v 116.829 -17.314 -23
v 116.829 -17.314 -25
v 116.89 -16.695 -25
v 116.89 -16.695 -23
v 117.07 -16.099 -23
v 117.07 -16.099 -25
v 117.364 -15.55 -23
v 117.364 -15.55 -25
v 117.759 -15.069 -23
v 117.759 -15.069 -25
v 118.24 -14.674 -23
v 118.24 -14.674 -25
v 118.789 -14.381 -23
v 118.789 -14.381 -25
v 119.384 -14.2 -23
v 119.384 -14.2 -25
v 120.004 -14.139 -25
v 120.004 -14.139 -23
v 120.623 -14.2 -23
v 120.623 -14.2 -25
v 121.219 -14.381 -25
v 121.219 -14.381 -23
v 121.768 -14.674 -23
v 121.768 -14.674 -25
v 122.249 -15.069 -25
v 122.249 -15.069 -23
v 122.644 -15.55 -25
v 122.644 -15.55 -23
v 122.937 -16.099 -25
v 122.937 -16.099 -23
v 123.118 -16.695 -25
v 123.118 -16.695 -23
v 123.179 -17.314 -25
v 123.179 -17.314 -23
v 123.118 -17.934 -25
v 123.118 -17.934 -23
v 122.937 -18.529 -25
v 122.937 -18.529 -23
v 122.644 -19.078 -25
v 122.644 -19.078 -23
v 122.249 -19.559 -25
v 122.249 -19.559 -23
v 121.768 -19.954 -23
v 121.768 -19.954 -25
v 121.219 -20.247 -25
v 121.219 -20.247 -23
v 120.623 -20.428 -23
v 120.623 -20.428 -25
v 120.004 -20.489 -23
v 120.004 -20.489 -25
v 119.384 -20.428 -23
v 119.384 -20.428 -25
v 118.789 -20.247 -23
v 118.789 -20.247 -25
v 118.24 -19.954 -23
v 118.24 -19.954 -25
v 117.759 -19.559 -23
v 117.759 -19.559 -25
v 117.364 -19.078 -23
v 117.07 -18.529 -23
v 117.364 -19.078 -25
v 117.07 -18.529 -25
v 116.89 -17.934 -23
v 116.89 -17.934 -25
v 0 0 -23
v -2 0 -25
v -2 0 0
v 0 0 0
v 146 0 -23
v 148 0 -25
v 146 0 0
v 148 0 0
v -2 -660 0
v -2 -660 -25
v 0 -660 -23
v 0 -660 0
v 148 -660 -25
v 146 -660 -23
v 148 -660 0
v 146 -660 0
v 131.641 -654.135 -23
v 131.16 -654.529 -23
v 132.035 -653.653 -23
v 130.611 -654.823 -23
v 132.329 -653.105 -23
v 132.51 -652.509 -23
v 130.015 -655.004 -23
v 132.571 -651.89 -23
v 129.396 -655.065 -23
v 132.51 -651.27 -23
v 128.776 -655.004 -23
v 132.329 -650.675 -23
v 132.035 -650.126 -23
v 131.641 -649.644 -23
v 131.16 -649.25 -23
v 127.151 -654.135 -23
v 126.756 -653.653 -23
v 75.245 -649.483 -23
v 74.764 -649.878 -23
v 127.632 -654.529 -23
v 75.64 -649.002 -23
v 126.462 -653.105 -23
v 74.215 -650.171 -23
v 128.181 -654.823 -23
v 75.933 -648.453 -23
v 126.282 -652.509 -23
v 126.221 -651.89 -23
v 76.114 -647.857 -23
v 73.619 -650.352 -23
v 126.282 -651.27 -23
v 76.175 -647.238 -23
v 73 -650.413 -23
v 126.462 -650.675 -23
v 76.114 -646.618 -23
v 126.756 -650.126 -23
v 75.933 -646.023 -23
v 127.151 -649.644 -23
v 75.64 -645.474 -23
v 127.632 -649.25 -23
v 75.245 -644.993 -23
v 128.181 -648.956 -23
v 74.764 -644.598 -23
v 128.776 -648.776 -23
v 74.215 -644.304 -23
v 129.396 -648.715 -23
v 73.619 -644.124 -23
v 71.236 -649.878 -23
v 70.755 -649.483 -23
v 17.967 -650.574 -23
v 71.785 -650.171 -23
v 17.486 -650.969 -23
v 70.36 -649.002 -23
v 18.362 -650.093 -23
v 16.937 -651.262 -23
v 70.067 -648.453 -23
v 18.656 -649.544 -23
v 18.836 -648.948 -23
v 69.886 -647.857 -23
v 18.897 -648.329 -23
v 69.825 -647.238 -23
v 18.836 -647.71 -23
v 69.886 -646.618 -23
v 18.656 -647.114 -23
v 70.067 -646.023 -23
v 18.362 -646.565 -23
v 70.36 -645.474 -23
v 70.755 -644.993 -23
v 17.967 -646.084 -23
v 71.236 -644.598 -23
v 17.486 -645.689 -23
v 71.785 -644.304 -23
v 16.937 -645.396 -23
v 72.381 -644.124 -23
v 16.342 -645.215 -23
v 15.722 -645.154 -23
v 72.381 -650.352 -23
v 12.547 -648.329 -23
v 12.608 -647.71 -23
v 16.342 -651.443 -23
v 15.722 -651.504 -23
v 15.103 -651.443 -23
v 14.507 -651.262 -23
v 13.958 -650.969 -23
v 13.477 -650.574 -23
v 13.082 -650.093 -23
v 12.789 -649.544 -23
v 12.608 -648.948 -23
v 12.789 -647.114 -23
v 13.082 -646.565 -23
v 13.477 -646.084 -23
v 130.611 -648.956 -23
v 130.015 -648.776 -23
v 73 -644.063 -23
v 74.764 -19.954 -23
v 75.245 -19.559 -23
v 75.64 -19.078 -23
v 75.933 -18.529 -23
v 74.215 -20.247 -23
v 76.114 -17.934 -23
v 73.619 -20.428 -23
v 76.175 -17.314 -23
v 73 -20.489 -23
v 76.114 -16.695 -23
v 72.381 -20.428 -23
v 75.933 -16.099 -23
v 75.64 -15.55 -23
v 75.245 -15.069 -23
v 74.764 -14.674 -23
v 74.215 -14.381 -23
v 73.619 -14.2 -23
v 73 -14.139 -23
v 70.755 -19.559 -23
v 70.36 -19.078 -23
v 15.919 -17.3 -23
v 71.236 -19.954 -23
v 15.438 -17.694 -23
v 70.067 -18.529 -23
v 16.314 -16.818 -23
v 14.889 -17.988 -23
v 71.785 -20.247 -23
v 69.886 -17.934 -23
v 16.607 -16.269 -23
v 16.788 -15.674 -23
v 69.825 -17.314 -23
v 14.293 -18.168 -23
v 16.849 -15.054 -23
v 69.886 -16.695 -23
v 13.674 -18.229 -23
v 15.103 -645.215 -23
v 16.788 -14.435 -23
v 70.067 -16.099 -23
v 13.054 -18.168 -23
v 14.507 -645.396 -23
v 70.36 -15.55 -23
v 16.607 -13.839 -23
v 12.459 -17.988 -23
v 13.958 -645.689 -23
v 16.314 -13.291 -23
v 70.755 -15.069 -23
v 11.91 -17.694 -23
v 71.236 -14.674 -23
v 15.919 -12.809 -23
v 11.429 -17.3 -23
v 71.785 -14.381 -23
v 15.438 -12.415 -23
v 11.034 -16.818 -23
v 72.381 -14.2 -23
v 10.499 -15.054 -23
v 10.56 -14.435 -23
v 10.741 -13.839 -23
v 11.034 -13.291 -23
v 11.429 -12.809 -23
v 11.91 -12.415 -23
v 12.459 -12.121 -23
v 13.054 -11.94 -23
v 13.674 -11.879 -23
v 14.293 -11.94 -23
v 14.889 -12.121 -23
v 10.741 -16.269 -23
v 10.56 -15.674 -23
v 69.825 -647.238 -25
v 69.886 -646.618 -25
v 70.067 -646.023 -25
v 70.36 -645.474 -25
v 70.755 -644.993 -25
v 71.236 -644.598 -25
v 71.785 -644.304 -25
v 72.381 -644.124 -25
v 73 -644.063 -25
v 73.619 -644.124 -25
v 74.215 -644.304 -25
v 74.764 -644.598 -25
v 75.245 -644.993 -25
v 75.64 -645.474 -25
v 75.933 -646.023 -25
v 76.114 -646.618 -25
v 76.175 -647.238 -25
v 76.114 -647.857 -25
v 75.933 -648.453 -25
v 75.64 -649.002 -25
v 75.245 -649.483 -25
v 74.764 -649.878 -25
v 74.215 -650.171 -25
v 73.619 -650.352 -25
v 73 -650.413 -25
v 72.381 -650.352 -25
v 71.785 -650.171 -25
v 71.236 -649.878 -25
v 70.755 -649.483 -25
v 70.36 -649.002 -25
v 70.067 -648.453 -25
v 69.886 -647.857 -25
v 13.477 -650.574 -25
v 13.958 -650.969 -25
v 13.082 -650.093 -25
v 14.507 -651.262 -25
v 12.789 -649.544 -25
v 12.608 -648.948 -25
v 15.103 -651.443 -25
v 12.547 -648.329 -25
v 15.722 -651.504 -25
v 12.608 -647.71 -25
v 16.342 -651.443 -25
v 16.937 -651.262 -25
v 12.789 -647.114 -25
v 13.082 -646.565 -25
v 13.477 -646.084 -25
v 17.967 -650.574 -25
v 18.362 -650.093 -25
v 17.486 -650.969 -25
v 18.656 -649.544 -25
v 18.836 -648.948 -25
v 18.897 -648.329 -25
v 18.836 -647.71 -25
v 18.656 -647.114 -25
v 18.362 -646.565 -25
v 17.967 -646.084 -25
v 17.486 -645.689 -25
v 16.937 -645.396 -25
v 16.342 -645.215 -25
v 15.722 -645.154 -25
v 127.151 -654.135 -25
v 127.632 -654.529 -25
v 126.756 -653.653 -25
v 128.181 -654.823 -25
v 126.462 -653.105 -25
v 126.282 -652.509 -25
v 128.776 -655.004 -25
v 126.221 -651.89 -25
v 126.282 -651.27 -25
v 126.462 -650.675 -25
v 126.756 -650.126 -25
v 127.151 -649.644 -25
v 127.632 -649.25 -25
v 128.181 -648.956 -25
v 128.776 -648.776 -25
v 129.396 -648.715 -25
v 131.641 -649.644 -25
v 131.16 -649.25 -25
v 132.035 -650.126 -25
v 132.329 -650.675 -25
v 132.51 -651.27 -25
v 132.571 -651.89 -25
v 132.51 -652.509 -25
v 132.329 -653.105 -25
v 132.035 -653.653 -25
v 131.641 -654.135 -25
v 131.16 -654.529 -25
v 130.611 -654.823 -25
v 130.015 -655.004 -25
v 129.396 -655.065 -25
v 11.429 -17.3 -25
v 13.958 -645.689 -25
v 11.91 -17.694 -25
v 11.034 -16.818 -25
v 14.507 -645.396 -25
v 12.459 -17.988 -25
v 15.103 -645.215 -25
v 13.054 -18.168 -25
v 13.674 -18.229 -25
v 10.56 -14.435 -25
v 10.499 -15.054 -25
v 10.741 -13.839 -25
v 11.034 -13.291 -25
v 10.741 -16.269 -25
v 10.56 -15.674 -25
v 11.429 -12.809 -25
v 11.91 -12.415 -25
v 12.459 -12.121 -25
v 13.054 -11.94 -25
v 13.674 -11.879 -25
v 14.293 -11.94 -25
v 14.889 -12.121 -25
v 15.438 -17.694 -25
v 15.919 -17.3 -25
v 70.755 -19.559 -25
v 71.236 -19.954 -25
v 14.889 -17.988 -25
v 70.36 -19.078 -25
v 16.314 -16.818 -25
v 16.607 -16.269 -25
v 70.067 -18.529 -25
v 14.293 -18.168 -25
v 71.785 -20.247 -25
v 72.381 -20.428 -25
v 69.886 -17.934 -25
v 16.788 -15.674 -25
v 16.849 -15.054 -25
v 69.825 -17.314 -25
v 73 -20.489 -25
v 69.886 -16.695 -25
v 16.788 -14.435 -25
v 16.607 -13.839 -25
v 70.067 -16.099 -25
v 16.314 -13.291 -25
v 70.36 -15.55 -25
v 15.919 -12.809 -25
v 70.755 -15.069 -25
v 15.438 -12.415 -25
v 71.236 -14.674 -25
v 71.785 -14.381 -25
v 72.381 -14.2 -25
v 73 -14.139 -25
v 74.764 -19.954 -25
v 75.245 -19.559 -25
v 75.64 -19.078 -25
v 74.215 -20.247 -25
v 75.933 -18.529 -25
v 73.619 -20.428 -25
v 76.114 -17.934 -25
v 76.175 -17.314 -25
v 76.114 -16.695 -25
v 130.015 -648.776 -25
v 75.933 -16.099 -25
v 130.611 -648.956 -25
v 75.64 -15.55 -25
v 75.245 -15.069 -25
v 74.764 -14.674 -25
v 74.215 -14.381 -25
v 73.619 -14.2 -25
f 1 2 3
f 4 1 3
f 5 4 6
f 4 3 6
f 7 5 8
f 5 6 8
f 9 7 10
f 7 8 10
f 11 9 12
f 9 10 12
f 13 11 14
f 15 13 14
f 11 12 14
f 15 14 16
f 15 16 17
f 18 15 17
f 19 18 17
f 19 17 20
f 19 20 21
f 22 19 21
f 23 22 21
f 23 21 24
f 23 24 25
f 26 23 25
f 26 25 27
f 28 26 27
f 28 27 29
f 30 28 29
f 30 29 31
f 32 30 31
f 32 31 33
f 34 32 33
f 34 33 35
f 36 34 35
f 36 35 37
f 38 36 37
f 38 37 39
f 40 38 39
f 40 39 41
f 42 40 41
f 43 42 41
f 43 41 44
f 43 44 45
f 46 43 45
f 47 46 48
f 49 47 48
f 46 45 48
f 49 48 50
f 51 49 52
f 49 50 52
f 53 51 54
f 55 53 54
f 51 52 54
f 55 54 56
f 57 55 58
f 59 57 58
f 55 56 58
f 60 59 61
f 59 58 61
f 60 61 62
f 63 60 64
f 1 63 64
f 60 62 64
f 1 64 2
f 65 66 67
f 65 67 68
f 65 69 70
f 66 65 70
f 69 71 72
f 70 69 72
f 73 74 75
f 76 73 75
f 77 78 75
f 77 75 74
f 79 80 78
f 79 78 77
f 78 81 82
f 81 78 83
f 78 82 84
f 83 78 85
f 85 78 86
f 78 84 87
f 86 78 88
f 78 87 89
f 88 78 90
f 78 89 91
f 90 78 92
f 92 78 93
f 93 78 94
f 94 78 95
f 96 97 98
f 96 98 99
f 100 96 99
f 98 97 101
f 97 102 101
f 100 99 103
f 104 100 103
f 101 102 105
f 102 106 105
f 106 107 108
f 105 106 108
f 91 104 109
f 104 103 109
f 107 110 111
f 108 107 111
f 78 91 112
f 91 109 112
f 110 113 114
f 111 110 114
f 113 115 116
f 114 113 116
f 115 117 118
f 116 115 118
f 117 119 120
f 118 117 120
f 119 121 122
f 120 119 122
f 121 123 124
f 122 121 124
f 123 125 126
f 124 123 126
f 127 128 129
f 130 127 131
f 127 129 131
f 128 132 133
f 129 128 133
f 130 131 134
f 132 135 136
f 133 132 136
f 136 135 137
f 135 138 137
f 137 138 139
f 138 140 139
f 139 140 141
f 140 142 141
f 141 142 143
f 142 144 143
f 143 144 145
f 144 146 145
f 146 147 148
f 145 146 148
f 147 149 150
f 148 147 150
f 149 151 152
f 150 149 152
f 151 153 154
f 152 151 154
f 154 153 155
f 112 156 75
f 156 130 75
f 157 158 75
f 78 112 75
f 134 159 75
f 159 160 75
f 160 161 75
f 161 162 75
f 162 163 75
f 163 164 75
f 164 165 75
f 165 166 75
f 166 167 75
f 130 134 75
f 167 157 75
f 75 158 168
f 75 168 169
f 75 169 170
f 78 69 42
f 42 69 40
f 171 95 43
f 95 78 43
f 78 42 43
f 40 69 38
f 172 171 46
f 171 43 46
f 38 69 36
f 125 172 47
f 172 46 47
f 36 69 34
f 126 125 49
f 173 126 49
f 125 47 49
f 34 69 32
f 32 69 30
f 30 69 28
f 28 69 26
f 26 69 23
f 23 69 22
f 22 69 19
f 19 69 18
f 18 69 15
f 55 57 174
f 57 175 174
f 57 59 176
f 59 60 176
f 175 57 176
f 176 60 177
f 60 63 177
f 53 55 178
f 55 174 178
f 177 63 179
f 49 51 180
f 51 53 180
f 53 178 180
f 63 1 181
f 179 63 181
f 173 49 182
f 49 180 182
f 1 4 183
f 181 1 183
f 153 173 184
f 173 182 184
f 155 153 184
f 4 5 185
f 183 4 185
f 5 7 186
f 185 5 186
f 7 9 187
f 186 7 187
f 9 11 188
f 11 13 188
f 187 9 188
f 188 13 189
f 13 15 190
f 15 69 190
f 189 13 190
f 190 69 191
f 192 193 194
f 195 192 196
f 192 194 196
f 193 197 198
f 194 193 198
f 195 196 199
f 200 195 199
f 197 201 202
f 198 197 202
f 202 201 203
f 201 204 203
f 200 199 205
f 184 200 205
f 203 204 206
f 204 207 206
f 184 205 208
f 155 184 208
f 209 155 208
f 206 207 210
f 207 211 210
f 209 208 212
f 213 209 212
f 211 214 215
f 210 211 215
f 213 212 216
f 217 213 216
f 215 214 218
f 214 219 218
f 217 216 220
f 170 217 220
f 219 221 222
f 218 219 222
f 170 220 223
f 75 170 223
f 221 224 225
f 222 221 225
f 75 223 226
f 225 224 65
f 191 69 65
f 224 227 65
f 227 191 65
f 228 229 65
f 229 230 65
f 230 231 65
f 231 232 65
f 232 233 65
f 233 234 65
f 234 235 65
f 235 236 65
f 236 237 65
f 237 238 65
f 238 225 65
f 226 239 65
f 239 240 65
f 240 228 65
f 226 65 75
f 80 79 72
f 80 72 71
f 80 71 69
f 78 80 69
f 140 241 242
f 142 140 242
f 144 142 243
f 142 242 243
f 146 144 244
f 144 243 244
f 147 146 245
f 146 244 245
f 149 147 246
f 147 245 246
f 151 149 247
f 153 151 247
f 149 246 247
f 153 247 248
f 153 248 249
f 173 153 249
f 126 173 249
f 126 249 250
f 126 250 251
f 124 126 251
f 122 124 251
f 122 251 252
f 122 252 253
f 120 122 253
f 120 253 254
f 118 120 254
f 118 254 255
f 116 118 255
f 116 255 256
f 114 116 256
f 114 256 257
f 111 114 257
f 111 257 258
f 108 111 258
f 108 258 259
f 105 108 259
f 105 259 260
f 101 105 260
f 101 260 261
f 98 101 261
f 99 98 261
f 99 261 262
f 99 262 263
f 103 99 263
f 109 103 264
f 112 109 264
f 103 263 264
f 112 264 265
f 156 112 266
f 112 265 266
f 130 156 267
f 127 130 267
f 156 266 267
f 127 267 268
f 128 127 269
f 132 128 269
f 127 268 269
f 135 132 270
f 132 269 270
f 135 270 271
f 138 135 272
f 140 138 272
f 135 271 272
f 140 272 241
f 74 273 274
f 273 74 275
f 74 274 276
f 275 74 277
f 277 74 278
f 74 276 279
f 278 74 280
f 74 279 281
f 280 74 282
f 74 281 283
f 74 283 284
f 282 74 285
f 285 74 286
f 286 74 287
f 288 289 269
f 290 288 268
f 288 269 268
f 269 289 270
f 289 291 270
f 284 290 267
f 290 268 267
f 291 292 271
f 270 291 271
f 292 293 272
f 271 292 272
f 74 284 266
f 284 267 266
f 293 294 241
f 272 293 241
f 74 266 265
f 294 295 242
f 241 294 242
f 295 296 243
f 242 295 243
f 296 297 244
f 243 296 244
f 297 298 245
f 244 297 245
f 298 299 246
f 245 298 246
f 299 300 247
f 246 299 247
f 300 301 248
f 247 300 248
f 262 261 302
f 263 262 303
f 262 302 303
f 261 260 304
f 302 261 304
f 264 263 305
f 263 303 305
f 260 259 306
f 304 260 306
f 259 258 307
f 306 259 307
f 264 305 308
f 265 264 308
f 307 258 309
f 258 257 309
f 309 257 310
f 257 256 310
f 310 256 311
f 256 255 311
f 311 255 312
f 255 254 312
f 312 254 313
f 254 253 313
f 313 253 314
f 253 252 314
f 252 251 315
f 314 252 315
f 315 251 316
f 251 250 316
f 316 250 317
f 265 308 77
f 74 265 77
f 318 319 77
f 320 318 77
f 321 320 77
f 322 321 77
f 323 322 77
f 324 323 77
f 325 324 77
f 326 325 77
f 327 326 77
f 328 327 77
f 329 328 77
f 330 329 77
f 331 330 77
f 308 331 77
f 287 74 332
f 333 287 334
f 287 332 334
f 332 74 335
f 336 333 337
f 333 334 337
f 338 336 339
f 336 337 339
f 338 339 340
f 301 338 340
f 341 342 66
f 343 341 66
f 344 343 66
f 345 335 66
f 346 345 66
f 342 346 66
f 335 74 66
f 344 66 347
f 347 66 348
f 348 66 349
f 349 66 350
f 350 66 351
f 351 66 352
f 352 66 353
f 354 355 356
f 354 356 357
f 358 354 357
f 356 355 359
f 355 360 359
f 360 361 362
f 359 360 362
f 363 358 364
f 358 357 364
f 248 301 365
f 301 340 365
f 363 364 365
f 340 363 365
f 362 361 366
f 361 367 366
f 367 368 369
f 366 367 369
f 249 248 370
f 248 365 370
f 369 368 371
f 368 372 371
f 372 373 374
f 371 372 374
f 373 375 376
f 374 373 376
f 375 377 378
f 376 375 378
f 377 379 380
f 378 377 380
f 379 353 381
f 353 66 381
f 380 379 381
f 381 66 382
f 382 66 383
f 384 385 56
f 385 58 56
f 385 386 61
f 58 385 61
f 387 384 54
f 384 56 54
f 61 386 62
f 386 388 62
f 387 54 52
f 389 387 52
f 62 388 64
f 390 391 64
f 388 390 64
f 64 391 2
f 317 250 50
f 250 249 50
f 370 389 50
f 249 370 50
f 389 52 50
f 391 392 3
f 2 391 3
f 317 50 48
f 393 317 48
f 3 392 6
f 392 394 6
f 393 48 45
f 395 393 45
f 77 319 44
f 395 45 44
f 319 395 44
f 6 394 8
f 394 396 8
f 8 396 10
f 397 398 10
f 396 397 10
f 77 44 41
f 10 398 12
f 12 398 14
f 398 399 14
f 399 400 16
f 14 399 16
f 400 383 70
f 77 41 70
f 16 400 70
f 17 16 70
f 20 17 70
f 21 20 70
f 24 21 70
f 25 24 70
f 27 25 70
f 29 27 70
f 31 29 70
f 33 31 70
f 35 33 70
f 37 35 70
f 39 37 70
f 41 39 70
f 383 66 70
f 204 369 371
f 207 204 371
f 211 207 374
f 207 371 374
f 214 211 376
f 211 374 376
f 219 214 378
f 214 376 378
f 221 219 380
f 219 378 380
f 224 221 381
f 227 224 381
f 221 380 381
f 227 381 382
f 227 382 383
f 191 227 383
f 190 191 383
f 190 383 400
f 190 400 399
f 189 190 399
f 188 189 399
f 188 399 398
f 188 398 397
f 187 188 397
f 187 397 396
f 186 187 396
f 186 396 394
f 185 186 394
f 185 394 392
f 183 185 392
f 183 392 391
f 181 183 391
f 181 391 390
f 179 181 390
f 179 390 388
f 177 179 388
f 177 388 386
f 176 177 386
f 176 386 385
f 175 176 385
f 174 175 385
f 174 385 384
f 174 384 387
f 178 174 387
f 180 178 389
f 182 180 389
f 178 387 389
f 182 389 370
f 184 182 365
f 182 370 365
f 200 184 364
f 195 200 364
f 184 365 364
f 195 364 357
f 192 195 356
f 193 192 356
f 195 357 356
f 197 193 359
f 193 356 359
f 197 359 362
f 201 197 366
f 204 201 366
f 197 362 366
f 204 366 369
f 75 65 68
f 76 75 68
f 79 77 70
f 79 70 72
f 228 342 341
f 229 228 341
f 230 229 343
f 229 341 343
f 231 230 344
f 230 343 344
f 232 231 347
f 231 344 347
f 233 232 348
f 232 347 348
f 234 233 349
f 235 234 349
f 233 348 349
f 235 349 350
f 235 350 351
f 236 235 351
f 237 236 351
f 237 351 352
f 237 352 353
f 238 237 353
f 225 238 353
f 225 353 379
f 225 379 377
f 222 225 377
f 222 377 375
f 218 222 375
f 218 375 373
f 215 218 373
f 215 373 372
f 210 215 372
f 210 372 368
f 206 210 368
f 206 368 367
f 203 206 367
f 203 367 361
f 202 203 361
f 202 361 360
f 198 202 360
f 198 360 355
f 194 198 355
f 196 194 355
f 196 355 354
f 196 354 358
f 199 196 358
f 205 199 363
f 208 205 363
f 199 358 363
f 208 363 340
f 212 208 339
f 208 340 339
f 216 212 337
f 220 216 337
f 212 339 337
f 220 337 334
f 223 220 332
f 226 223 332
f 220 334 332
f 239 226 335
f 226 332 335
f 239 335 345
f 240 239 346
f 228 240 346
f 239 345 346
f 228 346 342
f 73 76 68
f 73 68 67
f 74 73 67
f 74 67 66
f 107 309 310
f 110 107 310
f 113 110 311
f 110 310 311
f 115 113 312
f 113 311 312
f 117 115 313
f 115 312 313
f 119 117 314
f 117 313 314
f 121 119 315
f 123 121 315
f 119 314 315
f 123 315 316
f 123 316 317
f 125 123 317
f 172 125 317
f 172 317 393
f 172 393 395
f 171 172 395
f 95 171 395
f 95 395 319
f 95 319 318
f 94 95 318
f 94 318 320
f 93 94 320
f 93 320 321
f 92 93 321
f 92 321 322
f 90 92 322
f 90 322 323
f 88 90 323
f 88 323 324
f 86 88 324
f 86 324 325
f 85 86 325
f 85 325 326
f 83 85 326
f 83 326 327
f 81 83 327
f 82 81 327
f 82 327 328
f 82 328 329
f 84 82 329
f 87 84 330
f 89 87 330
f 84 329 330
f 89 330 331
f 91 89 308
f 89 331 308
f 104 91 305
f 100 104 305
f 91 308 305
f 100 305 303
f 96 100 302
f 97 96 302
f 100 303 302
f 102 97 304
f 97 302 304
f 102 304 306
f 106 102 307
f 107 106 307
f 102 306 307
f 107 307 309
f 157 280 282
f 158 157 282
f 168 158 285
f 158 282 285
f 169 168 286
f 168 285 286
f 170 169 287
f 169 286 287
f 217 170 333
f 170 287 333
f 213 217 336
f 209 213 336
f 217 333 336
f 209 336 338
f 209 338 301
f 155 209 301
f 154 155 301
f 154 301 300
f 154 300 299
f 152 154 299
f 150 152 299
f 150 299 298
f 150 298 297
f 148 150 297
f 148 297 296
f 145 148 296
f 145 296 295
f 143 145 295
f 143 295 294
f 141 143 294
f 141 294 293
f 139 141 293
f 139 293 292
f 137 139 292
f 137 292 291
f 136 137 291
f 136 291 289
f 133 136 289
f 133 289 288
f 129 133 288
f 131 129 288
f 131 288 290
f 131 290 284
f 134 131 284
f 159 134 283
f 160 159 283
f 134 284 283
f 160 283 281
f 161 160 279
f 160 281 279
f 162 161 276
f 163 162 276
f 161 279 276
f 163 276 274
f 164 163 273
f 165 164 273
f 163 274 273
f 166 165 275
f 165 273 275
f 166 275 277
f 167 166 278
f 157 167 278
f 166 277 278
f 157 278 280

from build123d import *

# Parameters (mm, degrees)
F1_DEPTH = 660
F3_D     = 6.35


with BuildPart() as f1:
    # F0 (on Front) → F1 (new body)
    with BuildSketch(Plane.XZ):
        Polygon((0, -23), (0, 0), (-2, 0), (-2, -25), (148, -25), (148, 0), (146, 0), (146, -23), align=None)
    extrude(amount=F1_DEPTH)

    # F3 (through all)
    with Locations(Plane.XY.offset(-23)):
        with Locations((15.7224, -648.32902), (73, -647.237599), (129.395574, -651.889563), (120.003812, -17.314114), (73, -17.314114), (13.673902, -15.054441)):
            Hole(F3_D / 2)


solid = f1.part
